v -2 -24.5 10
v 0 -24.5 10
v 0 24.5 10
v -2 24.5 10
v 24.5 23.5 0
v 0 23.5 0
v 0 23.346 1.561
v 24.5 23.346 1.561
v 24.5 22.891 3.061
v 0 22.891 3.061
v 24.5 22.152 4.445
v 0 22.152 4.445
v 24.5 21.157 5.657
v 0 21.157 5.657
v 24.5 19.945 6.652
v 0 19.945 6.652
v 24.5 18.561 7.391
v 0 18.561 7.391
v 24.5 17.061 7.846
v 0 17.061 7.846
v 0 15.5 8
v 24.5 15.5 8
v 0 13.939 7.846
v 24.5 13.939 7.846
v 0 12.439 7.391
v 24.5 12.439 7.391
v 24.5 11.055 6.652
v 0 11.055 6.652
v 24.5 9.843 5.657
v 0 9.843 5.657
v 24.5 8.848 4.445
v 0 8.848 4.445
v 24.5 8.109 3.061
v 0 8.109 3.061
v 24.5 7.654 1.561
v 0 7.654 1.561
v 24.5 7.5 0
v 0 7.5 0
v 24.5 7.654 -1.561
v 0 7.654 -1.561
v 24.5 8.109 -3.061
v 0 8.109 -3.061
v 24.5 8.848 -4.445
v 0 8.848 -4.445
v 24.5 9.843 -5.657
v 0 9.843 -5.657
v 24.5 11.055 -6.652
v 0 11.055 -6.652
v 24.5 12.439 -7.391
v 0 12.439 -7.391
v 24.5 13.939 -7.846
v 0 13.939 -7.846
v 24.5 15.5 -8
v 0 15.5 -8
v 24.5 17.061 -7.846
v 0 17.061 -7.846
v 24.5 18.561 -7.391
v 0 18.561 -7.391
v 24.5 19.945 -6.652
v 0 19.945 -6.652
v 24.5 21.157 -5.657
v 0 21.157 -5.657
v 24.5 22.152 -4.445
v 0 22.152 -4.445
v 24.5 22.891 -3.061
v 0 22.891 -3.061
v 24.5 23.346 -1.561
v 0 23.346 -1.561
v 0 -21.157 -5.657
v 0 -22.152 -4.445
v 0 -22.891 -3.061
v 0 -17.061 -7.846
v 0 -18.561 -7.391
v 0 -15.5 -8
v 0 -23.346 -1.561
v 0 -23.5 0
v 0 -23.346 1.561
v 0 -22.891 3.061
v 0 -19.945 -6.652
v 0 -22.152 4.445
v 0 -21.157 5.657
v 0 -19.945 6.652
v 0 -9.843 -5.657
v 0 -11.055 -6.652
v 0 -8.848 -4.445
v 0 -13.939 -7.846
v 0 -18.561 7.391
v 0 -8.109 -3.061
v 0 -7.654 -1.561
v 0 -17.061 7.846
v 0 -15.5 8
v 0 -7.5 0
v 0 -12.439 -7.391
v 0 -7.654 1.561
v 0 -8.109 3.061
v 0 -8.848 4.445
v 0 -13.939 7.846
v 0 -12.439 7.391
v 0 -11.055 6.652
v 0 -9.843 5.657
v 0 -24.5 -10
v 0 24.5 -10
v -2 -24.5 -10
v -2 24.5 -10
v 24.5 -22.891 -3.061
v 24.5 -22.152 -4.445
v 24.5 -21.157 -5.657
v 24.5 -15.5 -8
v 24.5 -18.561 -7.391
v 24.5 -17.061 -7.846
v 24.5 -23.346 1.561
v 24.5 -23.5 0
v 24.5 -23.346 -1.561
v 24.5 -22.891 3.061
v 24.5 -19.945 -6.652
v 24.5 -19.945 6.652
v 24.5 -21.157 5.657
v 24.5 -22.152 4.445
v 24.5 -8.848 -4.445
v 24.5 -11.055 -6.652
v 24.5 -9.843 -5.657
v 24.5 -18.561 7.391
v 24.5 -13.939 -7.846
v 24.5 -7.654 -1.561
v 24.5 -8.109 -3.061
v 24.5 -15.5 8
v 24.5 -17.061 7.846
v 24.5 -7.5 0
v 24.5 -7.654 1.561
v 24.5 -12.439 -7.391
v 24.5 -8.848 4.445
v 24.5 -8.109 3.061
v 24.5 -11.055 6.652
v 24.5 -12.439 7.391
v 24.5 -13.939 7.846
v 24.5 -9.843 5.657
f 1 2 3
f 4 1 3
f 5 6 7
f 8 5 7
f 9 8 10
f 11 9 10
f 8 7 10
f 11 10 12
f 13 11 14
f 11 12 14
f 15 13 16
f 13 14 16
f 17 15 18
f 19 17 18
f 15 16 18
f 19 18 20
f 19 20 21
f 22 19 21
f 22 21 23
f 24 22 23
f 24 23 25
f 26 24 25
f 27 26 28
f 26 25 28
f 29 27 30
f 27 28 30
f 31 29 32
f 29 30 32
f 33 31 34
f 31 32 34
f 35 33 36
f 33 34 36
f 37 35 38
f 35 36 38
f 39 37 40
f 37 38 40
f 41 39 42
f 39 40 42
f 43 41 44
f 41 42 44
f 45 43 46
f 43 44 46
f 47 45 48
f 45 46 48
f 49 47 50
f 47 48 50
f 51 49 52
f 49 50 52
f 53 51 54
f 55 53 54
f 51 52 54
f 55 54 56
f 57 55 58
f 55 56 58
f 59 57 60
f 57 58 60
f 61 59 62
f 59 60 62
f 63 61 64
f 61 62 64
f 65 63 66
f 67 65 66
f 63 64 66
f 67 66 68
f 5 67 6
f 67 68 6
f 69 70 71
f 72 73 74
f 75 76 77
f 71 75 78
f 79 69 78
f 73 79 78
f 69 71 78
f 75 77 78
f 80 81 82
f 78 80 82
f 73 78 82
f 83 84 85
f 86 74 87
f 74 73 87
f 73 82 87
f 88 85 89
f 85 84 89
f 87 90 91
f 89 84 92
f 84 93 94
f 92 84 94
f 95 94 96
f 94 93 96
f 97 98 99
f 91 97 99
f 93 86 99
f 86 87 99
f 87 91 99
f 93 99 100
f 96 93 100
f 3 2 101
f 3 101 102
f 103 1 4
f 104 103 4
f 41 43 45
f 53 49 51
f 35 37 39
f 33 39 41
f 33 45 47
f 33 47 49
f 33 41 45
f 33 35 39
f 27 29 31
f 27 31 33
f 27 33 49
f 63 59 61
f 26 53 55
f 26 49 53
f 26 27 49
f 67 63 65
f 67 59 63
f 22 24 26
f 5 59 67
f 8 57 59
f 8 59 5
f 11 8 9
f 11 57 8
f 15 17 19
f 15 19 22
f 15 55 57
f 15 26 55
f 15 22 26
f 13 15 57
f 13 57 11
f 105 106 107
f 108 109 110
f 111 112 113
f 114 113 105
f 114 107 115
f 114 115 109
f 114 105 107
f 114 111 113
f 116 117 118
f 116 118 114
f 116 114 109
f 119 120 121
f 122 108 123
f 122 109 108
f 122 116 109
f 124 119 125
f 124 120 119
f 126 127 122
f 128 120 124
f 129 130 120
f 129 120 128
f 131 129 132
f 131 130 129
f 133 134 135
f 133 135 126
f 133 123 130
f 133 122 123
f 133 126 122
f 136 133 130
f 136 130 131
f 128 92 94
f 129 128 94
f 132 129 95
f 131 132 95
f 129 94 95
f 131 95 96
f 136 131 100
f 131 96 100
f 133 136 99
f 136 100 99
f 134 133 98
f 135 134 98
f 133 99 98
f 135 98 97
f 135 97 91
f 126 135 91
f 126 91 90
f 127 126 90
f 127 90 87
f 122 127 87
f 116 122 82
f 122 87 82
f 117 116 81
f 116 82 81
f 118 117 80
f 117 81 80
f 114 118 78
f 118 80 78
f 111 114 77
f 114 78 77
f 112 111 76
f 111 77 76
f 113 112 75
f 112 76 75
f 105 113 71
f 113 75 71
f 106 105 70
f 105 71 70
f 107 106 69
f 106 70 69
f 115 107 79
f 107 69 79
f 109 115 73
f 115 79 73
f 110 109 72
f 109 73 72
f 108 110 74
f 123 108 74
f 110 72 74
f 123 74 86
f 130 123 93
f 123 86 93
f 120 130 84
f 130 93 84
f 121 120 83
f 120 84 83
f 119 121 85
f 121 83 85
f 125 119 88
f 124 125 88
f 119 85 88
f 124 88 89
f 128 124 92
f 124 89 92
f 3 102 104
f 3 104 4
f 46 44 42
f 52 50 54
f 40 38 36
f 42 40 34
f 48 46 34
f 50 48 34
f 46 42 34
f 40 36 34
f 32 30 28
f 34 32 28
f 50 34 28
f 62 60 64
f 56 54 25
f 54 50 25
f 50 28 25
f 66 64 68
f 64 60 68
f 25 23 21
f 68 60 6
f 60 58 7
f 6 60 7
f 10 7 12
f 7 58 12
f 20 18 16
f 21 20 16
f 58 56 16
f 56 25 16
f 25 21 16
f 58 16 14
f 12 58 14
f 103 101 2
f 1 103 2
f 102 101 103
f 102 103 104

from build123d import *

# Parameters (mm, degrees)
F0_R     = 8
F1_DEPTH = 24.5
F2_W     = 49
F2_H     = 20
F3_DEPTH = 2


with BuildPart() as f1:
    # F0 (on Right) → F1 (new body)
    with BuildSketch(Plane.YZ):
        with Locations((-15.5, 0)):
            Circle(F0_R)
        with Locations((15.5, 0)):
            Circle(F0_R)
    extrude(amount=F1_DEPTH)


with BuildPart() as f3:
    # F2 (on Right) → F3 (new body)
    with BuildSketch(Plane.YZ):
        Rectangle(F2_W, F2_H)
    extrude(amount=-F3_DEPTH)


solid = Compound([f1.part, f3.part])
